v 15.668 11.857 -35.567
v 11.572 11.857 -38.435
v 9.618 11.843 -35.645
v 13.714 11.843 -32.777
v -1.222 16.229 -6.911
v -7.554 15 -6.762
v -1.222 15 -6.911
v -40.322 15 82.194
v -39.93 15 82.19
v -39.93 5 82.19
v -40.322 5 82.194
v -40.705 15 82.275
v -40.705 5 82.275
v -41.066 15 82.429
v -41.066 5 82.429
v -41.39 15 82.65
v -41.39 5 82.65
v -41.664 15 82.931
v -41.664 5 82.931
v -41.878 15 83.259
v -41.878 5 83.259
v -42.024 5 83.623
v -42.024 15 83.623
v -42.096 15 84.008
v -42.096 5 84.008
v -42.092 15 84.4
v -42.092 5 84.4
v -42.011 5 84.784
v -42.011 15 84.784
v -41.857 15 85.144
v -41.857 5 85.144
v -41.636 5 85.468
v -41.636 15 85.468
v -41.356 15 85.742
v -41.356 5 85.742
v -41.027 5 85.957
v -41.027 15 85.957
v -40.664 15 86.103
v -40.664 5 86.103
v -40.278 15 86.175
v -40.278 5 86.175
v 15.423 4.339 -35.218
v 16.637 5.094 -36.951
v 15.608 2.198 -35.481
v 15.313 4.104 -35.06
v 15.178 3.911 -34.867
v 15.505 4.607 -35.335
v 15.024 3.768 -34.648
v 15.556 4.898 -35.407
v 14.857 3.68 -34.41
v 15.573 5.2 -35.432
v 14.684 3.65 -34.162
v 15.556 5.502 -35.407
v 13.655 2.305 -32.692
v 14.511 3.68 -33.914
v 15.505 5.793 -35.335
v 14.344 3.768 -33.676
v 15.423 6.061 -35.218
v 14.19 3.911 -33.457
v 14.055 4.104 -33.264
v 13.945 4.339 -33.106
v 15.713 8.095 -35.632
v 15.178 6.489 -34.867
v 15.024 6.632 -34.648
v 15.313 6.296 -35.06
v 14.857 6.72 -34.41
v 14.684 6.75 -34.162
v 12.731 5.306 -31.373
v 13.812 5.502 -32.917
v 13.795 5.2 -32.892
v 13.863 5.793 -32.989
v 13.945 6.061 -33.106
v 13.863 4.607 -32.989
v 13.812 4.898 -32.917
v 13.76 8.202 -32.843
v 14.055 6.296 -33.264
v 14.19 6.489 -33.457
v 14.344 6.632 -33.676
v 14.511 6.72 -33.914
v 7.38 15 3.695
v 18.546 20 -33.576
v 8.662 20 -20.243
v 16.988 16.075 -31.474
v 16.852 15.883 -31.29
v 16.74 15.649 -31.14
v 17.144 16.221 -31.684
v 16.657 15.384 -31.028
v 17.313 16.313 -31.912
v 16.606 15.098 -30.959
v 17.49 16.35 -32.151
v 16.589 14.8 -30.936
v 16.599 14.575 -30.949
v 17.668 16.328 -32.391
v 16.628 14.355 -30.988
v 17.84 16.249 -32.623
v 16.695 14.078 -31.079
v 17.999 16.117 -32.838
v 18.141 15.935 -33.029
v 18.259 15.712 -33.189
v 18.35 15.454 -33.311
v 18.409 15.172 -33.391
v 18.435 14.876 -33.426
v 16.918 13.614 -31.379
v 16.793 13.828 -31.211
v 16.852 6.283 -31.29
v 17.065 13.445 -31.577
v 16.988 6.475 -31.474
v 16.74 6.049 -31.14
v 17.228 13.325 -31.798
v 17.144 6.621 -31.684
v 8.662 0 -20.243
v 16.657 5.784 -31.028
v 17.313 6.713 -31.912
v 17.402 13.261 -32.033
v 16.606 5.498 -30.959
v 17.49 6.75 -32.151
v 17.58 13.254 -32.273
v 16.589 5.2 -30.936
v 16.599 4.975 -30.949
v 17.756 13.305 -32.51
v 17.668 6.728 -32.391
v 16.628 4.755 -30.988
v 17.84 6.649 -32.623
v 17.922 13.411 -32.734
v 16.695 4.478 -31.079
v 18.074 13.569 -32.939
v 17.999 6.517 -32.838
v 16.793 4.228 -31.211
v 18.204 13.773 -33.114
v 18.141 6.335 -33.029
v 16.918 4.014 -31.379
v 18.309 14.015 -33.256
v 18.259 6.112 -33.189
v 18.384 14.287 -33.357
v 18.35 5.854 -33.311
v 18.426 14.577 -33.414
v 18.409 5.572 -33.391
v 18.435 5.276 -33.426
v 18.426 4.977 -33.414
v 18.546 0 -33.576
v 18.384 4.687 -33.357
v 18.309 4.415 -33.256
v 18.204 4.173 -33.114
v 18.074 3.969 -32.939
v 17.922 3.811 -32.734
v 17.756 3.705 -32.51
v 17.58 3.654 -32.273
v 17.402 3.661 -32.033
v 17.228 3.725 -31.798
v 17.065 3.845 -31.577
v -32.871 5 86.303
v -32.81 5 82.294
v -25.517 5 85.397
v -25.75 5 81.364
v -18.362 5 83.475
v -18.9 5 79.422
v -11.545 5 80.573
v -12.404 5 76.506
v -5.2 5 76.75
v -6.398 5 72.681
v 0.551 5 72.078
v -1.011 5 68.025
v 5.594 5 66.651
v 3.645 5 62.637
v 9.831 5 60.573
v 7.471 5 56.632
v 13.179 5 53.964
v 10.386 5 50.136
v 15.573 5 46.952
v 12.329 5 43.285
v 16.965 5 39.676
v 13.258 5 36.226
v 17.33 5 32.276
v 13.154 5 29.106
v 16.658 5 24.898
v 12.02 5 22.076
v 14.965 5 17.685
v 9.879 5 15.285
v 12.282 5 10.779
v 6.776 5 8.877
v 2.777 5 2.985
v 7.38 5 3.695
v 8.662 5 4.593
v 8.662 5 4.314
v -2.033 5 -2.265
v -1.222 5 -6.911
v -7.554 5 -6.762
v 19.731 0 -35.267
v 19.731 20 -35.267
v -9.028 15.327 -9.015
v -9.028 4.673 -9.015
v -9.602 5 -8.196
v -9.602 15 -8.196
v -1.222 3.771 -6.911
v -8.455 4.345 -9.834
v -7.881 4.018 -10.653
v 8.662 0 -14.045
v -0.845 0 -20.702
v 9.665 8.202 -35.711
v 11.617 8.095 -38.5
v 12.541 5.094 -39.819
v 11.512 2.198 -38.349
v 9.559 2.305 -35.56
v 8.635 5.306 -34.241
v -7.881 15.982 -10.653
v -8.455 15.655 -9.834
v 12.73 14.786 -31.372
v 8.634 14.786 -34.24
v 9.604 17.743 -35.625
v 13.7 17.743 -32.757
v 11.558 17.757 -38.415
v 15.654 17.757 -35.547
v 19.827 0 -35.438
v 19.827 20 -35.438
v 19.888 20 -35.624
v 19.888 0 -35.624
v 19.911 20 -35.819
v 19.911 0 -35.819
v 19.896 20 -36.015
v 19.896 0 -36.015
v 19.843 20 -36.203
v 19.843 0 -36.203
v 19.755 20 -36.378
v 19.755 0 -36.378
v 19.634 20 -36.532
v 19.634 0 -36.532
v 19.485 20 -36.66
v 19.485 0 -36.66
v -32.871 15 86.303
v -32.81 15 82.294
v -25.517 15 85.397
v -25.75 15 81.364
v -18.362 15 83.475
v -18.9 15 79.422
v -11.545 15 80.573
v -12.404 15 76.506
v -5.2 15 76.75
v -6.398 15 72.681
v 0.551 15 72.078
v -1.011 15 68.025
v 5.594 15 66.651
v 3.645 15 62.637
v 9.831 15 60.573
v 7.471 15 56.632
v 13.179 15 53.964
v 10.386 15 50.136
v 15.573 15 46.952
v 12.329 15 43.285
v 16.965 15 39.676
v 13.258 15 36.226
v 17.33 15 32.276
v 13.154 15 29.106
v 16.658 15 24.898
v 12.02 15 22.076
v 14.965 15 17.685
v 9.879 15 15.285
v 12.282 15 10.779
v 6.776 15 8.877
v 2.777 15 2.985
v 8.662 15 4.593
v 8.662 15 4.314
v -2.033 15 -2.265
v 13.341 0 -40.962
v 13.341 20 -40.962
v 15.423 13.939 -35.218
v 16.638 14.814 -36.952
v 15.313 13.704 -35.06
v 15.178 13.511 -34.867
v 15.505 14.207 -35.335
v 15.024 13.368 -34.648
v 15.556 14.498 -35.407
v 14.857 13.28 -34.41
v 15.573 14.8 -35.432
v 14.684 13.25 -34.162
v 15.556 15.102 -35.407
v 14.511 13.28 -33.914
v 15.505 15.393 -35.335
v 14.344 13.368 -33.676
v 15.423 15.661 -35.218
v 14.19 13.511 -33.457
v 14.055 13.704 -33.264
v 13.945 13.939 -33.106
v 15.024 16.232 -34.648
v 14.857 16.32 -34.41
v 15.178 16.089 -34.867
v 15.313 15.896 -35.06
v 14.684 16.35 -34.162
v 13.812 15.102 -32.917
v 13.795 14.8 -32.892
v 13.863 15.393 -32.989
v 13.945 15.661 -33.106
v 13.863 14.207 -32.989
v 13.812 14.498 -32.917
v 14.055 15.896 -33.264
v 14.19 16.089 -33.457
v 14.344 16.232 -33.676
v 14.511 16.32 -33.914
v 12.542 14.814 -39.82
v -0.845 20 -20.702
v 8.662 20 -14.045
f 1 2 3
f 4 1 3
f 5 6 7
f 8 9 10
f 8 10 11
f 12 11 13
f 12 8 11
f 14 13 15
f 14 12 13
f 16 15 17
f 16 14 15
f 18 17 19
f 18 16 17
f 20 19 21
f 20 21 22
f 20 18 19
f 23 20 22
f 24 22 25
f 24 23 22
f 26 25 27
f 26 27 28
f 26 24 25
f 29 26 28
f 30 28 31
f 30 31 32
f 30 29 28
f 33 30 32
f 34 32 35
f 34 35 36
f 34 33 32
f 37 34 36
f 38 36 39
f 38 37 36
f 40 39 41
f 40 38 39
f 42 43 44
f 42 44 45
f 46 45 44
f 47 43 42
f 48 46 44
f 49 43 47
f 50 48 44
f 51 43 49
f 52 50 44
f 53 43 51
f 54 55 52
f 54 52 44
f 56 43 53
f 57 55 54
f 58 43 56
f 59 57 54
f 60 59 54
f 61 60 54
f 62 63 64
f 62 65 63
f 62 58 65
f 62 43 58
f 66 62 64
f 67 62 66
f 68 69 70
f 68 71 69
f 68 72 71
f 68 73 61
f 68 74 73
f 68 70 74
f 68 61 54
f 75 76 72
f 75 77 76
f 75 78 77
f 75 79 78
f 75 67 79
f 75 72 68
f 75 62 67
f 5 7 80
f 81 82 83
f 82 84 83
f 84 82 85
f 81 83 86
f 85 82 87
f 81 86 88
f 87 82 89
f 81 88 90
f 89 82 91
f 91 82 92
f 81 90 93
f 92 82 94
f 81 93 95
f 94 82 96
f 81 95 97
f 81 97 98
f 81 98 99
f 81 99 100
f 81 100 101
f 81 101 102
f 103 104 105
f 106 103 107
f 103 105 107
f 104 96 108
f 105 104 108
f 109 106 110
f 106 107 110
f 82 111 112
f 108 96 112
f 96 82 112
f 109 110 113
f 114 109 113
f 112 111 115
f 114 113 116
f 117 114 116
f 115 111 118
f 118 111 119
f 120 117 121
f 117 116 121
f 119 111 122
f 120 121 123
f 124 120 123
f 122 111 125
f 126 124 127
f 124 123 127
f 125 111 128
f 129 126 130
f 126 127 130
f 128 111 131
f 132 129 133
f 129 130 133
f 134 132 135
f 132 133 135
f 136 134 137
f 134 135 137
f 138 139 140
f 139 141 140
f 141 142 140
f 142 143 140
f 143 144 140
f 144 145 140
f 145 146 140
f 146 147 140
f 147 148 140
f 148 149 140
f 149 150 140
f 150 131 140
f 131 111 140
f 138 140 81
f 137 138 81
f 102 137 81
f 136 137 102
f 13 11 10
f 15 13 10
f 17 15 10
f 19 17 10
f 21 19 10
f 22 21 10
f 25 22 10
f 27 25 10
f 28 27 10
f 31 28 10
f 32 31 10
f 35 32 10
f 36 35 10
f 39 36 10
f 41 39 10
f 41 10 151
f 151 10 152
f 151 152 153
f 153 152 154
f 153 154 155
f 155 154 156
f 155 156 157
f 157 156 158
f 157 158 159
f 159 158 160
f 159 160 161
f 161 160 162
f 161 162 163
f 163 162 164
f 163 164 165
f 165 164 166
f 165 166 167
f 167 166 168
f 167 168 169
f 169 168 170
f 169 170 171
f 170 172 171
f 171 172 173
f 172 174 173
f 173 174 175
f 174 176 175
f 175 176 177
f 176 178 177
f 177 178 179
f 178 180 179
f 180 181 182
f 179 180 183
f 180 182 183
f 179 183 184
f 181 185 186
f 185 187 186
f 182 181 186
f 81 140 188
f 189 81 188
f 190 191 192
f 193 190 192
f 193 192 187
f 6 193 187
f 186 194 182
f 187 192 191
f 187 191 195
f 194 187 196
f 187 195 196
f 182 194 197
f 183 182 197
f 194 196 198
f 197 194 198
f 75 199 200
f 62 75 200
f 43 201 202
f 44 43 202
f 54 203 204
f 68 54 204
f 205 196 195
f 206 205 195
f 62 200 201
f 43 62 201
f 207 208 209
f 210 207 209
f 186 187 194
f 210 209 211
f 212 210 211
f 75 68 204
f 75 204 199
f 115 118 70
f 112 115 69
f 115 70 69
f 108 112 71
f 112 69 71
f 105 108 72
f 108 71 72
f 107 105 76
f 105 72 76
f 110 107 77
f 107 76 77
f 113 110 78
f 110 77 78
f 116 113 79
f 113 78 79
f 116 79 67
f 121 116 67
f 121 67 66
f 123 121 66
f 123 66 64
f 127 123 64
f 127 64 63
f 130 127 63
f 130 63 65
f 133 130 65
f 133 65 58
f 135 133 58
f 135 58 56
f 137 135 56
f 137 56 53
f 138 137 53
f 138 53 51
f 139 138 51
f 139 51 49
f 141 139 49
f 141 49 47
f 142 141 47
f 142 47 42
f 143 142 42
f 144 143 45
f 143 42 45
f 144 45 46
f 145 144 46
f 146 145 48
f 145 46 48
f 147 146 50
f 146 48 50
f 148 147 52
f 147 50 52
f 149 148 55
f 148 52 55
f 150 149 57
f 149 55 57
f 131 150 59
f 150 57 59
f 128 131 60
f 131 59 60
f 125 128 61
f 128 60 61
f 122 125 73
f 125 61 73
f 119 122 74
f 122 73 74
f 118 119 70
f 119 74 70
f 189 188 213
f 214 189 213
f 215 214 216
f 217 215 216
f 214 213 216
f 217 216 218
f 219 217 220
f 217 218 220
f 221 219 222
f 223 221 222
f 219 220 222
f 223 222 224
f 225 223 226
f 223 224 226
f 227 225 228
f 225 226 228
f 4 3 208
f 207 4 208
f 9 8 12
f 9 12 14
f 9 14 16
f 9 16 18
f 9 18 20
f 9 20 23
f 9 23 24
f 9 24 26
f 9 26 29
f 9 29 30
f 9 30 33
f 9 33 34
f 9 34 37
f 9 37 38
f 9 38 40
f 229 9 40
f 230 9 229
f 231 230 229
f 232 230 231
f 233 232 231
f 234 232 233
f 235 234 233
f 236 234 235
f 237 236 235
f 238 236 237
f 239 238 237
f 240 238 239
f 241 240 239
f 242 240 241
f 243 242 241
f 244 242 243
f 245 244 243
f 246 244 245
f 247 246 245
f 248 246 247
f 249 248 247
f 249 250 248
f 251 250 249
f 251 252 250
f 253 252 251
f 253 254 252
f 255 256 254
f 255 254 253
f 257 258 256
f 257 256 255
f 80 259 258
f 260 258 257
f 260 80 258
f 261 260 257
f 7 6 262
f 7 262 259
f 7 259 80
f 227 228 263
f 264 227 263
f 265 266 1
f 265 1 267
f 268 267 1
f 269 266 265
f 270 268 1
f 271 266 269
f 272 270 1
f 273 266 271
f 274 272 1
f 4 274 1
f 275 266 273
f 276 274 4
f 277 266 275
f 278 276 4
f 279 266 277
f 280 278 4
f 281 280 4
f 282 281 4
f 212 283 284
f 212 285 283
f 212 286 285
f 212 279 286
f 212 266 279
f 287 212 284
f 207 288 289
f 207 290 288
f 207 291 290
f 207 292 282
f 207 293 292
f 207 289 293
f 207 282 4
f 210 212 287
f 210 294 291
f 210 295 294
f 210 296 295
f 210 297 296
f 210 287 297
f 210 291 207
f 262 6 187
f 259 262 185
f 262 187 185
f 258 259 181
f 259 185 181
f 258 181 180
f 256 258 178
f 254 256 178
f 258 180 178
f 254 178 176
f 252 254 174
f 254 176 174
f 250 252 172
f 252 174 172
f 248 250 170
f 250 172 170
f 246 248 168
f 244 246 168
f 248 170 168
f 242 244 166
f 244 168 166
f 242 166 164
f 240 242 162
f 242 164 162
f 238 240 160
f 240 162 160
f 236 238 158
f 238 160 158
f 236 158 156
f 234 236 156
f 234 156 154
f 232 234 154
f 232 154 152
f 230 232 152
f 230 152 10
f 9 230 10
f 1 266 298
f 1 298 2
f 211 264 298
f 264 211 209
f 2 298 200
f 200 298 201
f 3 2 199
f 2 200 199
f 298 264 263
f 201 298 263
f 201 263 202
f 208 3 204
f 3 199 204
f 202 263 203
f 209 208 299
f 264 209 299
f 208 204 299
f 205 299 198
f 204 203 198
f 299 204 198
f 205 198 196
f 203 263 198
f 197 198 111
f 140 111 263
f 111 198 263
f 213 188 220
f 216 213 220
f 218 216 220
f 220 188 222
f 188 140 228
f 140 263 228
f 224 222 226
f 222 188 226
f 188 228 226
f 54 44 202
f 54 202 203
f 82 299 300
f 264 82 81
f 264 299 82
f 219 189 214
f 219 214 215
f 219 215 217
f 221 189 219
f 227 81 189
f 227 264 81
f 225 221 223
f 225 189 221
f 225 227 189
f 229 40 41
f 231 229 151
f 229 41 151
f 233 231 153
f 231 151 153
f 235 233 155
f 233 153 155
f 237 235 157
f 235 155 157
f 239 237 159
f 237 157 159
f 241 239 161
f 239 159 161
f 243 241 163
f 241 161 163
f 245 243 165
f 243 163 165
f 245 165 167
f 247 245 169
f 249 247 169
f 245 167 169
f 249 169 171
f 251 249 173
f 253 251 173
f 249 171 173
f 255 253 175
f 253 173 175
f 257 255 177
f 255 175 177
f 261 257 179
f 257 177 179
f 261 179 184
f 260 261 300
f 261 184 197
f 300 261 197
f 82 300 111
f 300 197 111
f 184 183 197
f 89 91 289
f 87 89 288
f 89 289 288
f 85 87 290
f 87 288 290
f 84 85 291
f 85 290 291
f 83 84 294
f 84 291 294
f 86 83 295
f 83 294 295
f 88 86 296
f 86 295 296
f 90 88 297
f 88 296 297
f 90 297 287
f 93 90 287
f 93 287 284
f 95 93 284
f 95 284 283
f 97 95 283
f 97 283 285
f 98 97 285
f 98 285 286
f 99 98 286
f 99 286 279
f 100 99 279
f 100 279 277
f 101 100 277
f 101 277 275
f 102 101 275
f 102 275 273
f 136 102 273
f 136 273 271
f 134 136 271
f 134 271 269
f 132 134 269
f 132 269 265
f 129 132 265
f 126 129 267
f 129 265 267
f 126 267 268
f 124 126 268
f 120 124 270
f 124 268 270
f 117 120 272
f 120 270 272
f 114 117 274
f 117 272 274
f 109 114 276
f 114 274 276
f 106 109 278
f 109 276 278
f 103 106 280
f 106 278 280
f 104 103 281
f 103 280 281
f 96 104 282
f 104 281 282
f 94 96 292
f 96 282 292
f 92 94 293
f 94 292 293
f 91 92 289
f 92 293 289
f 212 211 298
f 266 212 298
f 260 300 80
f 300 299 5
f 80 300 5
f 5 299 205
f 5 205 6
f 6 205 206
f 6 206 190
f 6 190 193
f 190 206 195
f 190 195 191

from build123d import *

# Parameters (mm, degrees)
EXTRUDE_5_DEPTH     = 20
SKETCH_4_R          = 1.55
CUT_EXTRUDE_1_DEPTH = 10
CUT_EXTRUDE_2_DEPTH = 5
CUT_EXTRUDE_START   = -5
CUT_EXTRUDE_3_DEPTH = 5
CUT_EXTRUDE_4_DEPTH = 5
EXTRUDE_7_DEPTH     = 20
CUT_EXTRUDE_6_DEPTH = 30
CUT_EXTRUDE_START_2 = -10
SKETCH_11_R         = 1
CUT_EXTRUDE_7_DEPTH = 10
EXTRUDE_8_DEPTH     = 10


with BuildPart() as part:
    # 草图1 → 凸台-拉伸5 (new body)
    with BuildSketch(Plane(origin=(0, 0, 0), x_dir=(1, 0, 0), z_dir=(0, 1, 0))):
        with BuildLine():
            Line((-9.02810898, 9.014963713), (-9.601685416, 8.195811669))
            Line((-9.601685416, 8.195811669), (-7.553805305, 6.761870578))
            ThreePointArc((-7.553805305, 6.761870578), (4.479399484, -61.481824974), (-63.764296068, -73.515029763))
            Line((-63.764296068, -73.515029763), (-66.058601813, -76.79163794))
            ThreePointArc((-66.058601813, -76.79163794), (6.240788915, -65.832756837), (-1.221646395, 6.910703583))
            Line((-1.221646395, 6.910703583), (18.546430176, 33.576189082))
            Line((18.546430176, 33.576189082), (19.730587978, 35.267341687))
            ThreePointArc((19.730587978, 35.267341687), (19.896243687, 36.014566301), (19.48501237, 36.660070167))
            Line((19.48501237, 36.660070167), (13.341372038, 40.96189344))
            Line((13.341372038, 40.96189344), (-7.880956107, 10.653267801))
            Line((-7.880956107, 10.653267801), (-8.454532543, 9.834115757))
            Line((-8.454532543, 9.834115757), (-9.02810898, 9.014963713))
        make_face()
    extrude(amount=EXTRUDE_5_DEPTH)

    # 草图4 → 切除-拉伸1 (cut)
    with BuildSketch(Plane(origin=(-10.293599492, 0, -7.20765596), x_dir=(-0.5735764363510502, 0, 0.8191520442889891), z_dir=(-0.8191520442889891, 0, -0.5735764363510502))):
        with Locations((-36.406315379, 14.8)):
            Circle(SKETCH_4_R)
        with Locations((-36.406315379, 5.2)):
            Circle(SKETCH_4_R)
    extrude(amount=-CUT_EXTRUDE_1_DEPTH, mode=Mode.SUBTRACT)

    # 草图4<4> → 切除-拉伸2 (cut)
    with BuildSketch(Plane(origin=(-10.293599492, 0, -7.20765596), x_dir=(-0.5735764363510502, 0, 0.8191520442889891), z_dir=(-0.8191520442889891, 0, -0.5735764363510502))):
        Polygon((-34.71546965, 11.84291122), (-32.99997851, 14.785770965), (-34.690824239, 17.742859745), (-38.097161108, 17.75708878), (-39.812652248, 14.814229035), (-38.121806519, 11.857140255), align=None)
        Polygon((-34.611807013, 2.304646298), (-33.001611337, 5.306412981), (-34.796119703, 8.201766683), (-38.200823744, 8.095353702), (-39.811019421, 5.093587019), (-38.016511055, 2.198233317), align=None)
    extrude(amount=-CUT_EXTRUDE_2_DEPTH, mode=Mode.SUBTRACT)

    # 草图5 → 切除-拉伸3 (cut)
    with BuildSketch(Plane(origin=(0, 20, 0), x_dir=(1, 0, 0), z_dir=(0, 1, 0)).offset(CUT_EXTRUDE_START)):
        with BuildLine():
            ThreePointArc((-7.553805305, 6.761870578), (4.479399484, -61.481824974), (-63.764296068, -73.515029763))
            Line((-63.764296068, -73.515029763), (-66.058601813, -76.79163794))
            ThreePointArc((-66.058601813, -76.79163794), (6.240788915, -65.832756837), (-1.221646395, 6.910703583))
            Line((-1.221646395, 6.910703583), (-7.553805305, 6.761870578))
        make_face()
    extrude(amount=CUT_EXTRUDE_3_DEPTH, mode=Mode.SUBTRACT)

    # 草图6 → 切除-拉伸4 (cut)
    with BuildSketch(Plane.XZ):
        with BuildLine():
            ThreePointArc((-1.221646395, -6.910703583), (6.240788915, 65.832756837), (-66.058601813, 76.79163794))
            Line((-66.058601813, 76.79163794), (-63.764296068, 73.515029763))
            ThreePointArc((-63.764296068, 73.515029763), (4.479399484, 61.481824974), (-7.553805305, -6.761870578))
            Line((-7.553805305, -6.761870578), (-1.221646395, -6.910703583))
        make_face()
    extrude(amount=-CUT_EXTRUDE_4_DEPTH, mode=Mode.SUBTRACT)

    # 草图9 → 凸台-拉伸7 (add)
    with BuildSketch(Plane(origin=(0, 0, 0), x_dir=(1, 0, 0), z_dir=(0, 1, 0))):
        Polygon((8.662391891, 20.243446333), (-1.221646395, 6.910703583), (8.662391891, -5.275766787), align=None)
    extrude(amount=EXTRUDE_7_DEPTH)

    # 草图7 → 切除-拉伸6 (cut)
    with BuildSketch(Plane(origin=(-10.293599492, 0, -7.20765596), x_dir=(-0.5735764363510472, 0, 0.819152044288991), z_dir=(-0.819152044288991, 0, -0.5735764363510472))):
        Polygon((-1.206315379, 5), (-16.473642116, 0), (0, 0), (28.572588785, 0), (28.572588785, 5), align=None)
        Polygon((-1.206315379, 20), (-16.473642116, 20), (-1.206315379, 15), (28.572588785, 15), (28.572588785, 20), align=None)
    extrude(amount=-CUT_EXTRUDE_6_DEPTH, mode=Mode.SUBTRACT)

    # 草图11 → 切除-拉伸7 (cut)
    with BuildSketch(Plane(origin=(0, 15, 0), x_dir=(1, 0, 0), z_dir=(0, 1, 0)).offset(CUT_EXTRUDE_START_2)):
        with Locations((-34.481669179, -37.284707791)):
            Circle(SKETCH_11_R)
        with BuildLine():
            Line((-63.764296068, -73.515029763), (-66.058601813, -76.79163794))
            ThreePointArc((-66.058601813, -76.79163794), (-53.786118283, -83.180288494), (-40.278305052, -86.174898591))
            Line((-40.278305052, -86.174898591), (-39.929682081, -82.190119799))
            ThreePointArc((-39.929682081, -82.190119799), (-52.41803771, -79.421518011), (-63.764296068, -73.515029763))
        make_face()
    extrude(amount=CUT_EXTRUDE_7_DEPTH, mode=Mode.SUBTRACT)

    # 草图18 → 凸台-拉伸8 (add)
    with BuildSketch(Plane(origin=(0, 15, 0), x_dir=(1, 0, 0), z_dir=(0, 1, 0))):
        with BuildLine():
            ThreePointArc((-39.929682081, -82.190119799), (-42.096382963, -84.00819771), (-40.278305052, -86.174898591))
            Line((-40.278305052, -86.174898591), (-39.929682081, -82.190119799))
        make_face()
    extrude(amount=-EXTRUDE_8_DEPTH)


solid = part.part
